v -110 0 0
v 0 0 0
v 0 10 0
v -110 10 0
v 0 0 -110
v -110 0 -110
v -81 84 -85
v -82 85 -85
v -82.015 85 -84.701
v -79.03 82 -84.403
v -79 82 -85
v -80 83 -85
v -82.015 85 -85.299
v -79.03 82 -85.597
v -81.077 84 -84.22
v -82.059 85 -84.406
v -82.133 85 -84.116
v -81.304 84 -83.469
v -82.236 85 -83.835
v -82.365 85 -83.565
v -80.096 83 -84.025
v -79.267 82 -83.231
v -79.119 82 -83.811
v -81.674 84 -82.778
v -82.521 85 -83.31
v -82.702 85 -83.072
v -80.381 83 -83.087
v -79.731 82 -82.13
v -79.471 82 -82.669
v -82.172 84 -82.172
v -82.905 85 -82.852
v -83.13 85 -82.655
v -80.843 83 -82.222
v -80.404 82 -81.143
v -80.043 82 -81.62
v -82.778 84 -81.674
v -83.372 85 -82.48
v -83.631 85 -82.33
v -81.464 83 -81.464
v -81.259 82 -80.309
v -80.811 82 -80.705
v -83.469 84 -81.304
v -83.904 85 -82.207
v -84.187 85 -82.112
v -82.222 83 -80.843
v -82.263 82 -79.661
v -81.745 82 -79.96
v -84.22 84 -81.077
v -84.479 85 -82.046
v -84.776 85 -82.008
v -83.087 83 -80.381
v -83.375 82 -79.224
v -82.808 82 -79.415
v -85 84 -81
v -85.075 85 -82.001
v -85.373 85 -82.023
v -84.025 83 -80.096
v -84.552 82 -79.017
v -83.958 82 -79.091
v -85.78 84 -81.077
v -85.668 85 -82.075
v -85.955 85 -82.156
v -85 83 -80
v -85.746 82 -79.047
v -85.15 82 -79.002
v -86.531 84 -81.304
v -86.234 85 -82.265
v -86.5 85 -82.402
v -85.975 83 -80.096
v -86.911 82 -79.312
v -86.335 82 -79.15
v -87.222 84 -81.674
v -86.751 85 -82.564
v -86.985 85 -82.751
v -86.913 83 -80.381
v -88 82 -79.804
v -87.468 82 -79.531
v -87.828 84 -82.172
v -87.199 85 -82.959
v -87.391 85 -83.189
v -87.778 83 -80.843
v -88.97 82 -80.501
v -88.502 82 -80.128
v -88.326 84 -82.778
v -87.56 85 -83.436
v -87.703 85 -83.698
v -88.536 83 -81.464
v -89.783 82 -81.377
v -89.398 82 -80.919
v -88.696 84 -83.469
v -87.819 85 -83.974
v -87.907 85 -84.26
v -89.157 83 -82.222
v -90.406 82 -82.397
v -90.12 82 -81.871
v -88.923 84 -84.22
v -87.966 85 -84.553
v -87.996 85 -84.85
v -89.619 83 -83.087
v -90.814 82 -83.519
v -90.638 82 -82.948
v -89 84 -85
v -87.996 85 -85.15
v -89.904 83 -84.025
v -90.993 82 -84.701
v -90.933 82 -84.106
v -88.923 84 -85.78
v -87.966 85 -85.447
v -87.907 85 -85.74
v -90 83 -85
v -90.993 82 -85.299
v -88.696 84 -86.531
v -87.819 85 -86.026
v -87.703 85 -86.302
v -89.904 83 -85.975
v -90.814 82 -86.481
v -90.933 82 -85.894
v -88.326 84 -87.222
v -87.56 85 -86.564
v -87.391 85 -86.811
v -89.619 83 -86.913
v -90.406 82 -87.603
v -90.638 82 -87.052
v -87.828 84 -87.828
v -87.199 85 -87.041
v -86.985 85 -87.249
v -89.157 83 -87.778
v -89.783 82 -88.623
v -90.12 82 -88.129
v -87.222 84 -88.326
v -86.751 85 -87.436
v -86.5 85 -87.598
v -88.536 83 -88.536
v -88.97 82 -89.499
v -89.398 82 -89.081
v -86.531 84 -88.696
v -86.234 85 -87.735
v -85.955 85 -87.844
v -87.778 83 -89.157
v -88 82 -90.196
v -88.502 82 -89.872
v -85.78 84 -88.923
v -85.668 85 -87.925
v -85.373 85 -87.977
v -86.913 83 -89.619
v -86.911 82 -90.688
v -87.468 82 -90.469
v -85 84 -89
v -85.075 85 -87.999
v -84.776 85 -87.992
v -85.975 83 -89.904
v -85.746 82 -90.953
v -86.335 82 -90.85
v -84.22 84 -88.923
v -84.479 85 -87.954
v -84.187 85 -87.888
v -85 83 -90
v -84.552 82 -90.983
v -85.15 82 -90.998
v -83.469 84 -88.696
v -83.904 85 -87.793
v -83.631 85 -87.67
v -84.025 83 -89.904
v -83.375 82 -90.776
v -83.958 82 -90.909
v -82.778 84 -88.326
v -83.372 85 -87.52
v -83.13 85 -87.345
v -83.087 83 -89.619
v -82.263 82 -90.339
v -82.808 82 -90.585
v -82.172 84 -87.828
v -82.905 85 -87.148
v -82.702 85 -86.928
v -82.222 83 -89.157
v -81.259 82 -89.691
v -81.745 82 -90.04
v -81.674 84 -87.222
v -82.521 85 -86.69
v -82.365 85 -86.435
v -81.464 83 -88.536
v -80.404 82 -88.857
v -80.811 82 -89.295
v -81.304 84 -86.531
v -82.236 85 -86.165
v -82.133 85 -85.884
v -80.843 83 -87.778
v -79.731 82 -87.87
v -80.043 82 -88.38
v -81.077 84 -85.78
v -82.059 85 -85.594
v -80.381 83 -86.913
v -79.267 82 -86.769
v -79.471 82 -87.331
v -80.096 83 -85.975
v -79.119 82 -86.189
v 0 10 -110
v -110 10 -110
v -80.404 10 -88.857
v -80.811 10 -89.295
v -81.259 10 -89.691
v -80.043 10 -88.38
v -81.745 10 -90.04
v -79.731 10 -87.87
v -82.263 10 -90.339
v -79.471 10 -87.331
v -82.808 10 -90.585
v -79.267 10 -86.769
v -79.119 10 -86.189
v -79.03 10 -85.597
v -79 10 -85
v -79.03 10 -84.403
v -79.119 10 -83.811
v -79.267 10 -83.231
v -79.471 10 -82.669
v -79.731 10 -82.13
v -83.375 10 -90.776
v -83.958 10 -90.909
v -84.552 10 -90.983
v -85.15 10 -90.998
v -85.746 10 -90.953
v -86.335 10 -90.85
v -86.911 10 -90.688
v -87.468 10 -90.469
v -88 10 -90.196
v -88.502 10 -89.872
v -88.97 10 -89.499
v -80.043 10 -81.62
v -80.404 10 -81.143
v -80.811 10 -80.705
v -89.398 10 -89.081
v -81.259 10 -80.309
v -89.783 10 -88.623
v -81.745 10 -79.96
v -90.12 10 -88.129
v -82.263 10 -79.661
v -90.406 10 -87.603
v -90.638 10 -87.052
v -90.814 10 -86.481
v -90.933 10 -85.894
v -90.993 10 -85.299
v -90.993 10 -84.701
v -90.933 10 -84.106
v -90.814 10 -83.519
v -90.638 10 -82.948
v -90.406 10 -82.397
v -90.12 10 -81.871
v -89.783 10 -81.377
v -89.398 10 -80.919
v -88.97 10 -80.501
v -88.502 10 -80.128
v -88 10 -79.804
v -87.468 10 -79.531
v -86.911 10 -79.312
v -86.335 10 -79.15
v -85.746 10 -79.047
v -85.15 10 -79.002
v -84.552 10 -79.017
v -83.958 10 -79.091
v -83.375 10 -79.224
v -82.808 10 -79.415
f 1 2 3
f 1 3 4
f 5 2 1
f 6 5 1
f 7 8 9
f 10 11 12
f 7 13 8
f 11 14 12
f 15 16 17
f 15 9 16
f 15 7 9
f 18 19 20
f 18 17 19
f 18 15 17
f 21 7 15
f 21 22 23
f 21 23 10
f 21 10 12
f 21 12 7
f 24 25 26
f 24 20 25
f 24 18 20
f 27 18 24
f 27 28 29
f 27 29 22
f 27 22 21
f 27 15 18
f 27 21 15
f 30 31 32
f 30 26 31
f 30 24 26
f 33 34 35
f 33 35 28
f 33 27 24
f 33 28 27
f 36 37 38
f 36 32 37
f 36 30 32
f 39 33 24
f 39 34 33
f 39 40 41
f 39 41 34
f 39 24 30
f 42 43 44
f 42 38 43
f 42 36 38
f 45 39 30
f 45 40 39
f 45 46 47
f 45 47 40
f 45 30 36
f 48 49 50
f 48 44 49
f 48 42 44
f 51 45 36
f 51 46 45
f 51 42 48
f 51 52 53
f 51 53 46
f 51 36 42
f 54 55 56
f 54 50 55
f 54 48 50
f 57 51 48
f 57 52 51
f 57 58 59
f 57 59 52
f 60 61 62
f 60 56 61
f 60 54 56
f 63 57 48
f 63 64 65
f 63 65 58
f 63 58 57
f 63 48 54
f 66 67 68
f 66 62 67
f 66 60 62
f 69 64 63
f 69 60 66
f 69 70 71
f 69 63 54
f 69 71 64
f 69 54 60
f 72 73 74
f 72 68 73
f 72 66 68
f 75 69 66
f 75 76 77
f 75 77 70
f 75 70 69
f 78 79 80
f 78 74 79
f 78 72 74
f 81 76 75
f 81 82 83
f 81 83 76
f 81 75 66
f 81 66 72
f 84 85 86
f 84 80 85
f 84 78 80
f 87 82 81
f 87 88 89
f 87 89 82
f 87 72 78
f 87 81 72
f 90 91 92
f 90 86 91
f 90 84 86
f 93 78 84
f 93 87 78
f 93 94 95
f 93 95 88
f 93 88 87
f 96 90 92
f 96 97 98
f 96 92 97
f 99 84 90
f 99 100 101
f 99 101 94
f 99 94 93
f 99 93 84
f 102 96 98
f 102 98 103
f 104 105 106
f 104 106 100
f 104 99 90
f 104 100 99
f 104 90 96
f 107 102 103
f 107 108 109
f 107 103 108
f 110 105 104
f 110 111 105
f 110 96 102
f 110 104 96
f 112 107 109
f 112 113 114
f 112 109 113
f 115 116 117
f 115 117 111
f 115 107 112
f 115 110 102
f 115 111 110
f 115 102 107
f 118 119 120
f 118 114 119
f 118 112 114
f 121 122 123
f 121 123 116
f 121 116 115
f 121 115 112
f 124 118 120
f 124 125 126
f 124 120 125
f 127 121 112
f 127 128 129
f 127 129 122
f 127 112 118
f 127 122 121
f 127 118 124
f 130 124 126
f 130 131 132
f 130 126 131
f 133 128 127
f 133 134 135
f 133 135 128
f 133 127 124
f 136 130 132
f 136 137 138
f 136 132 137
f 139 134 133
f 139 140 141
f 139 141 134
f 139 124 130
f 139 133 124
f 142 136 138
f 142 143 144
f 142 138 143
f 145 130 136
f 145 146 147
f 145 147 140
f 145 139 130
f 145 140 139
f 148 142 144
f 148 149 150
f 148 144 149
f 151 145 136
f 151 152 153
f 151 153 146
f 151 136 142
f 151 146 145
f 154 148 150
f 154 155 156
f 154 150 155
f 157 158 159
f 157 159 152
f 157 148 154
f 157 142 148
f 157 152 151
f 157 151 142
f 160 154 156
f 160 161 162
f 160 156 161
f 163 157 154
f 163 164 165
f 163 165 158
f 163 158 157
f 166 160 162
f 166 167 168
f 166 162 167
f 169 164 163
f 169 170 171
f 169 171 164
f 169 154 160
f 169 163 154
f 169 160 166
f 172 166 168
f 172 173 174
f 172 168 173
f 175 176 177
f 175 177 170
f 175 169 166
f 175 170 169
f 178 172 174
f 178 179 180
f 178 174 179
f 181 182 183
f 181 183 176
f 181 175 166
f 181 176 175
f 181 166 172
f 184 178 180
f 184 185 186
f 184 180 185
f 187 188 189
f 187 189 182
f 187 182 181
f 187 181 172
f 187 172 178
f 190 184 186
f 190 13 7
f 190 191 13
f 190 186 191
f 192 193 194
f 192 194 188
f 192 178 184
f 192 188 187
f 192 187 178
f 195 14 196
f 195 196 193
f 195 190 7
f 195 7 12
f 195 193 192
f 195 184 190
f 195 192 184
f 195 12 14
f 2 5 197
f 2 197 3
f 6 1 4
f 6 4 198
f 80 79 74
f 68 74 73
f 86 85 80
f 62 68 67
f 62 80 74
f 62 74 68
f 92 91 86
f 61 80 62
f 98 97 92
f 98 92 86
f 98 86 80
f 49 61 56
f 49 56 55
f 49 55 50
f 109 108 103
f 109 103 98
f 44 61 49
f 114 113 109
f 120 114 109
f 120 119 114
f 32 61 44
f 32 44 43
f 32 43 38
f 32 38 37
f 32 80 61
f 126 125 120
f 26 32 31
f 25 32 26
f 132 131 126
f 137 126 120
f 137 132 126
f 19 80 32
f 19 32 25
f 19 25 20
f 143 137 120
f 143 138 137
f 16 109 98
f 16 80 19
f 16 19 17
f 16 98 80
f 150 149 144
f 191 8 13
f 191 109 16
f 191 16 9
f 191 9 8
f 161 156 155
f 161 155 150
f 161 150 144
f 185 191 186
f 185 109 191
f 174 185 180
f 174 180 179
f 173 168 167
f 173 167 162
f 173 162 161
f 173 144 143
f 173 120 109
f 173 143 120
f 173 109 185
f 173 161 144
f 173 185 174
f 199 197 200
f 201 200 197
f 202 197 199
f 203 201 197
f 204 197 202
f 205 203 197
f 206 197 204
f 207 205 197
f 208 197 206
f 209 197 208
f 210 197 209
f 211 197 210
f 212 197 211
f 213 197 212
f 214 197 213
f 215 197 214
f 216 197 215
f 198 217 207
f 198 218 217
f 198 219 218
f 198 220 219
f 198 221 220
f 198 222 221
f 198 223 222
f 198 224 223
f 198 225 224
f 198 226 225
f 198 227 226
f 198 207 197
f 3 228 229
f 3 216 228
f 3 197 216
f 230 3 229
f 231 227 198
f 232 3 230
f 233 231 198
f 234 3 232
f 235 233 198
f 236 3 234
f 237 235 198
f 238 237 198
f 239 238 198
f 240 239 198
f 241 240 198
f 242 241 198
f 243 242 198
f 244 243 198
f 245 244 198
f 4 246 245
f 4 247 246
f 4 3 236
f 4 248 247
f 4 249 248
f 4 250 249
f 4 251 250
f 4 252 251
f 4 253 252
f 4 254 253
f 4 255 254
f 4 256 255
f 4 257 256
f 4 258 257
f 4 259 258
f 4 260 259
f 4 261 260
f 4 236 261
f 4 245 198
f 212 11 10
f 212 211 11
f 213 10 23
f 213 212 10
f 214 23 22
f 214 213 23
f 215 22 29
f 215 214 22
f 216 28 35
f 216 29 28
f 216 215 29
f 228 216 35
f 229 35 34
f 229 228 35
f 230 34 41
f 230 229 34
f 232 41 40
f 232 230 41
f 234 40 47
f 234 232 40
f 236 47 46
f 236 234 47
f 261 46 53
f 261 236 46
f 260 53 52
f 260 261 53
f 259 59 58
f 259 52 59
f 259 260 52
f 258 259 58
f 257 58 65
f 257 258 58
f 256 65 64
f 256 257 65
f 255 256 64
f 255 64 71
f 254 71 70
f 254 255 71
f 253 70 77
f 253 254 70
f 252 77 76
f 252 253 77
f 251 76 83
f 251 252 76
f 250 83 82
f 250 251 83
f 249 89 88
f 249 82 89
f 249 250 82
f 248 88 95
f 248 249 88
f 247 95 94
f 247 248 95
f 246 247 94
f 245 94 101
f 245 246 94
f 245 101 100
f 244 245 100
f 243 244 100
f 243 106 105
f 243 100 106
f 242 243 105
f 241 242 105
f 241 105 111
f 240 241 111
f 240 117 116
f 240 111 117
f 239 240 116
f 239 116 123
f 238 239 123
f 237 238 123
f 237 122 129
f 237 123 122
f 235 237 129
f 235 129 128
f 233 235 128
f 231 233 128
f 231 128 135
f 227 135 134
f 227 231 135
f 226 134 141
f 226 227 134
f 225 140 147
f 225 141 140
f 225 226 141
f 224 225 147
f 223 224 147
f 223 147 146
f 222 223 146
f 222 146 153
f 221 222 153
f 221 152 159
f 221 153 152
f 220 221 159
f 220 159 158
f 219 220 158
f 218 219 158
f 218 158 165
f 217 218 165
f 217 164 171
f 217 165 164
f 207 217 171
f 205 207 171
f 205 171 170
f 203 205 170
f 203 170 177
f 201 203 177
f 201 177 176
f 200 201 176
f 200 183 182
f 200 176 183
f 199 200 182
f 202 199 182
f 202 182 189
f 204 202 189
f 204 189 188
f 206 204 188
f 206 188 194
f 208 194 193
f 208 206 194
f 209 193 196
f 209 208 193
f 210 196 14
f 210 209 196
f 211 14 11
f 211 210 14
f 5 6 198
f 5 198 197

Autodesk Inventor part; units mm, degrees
ref_plane "YZ Plane" through (0, 0, 0) normal (1, 0, 0) x (0, 1, 0)
ref_plane "XZ Plane" through (0, 0, 0) normal (0, 1, 0) x (-1, 0, 0)
ref_plane "XY Plane" through (0, 0, 0) normal (0, 0, 1) x (1, 0, 0)
sketch "Sketch1" plane through (0, 0, 0) normal (0, 1, 0) x (-1, 0, 0)
  line L0 (0, 0) -> (110, 0)
  line L1 (110, 0) -> (110, -110)
  line L2 (110, -110) -> (0, -110)
  line L3 (0, -110) -> (0, 0)
  dimension "d0" = 110
  dimension "d1" = 110
extrude "Extrusion1" add sketch "Sketch1" along normal blind 10
sketch "Sketch2" plane through (0, 10, 0) normal (0, 1, 0) x (1, 0, 0)
  circle A0 centre (-85, 85) radius 6
  line L0 (-110, 110) -> (-110, 0) projected
  line L1 (0, 110) -> (-110, 110) projected
  line L2 (0, 0) -> (0, 110) projected
  line L3 (-110, 0) -> (0, 0) projected
  dimension "d11" = 12
  dimension "d12" = 25
  dimension "d13" = 25
extrude "Extrusion3" add sketch "Sketch2" along normal blind 75 contours A0
chamfer "Chamfer1" distance 3 angle 45 1 edges at (-91, 85, -85)
properties part number "base"
